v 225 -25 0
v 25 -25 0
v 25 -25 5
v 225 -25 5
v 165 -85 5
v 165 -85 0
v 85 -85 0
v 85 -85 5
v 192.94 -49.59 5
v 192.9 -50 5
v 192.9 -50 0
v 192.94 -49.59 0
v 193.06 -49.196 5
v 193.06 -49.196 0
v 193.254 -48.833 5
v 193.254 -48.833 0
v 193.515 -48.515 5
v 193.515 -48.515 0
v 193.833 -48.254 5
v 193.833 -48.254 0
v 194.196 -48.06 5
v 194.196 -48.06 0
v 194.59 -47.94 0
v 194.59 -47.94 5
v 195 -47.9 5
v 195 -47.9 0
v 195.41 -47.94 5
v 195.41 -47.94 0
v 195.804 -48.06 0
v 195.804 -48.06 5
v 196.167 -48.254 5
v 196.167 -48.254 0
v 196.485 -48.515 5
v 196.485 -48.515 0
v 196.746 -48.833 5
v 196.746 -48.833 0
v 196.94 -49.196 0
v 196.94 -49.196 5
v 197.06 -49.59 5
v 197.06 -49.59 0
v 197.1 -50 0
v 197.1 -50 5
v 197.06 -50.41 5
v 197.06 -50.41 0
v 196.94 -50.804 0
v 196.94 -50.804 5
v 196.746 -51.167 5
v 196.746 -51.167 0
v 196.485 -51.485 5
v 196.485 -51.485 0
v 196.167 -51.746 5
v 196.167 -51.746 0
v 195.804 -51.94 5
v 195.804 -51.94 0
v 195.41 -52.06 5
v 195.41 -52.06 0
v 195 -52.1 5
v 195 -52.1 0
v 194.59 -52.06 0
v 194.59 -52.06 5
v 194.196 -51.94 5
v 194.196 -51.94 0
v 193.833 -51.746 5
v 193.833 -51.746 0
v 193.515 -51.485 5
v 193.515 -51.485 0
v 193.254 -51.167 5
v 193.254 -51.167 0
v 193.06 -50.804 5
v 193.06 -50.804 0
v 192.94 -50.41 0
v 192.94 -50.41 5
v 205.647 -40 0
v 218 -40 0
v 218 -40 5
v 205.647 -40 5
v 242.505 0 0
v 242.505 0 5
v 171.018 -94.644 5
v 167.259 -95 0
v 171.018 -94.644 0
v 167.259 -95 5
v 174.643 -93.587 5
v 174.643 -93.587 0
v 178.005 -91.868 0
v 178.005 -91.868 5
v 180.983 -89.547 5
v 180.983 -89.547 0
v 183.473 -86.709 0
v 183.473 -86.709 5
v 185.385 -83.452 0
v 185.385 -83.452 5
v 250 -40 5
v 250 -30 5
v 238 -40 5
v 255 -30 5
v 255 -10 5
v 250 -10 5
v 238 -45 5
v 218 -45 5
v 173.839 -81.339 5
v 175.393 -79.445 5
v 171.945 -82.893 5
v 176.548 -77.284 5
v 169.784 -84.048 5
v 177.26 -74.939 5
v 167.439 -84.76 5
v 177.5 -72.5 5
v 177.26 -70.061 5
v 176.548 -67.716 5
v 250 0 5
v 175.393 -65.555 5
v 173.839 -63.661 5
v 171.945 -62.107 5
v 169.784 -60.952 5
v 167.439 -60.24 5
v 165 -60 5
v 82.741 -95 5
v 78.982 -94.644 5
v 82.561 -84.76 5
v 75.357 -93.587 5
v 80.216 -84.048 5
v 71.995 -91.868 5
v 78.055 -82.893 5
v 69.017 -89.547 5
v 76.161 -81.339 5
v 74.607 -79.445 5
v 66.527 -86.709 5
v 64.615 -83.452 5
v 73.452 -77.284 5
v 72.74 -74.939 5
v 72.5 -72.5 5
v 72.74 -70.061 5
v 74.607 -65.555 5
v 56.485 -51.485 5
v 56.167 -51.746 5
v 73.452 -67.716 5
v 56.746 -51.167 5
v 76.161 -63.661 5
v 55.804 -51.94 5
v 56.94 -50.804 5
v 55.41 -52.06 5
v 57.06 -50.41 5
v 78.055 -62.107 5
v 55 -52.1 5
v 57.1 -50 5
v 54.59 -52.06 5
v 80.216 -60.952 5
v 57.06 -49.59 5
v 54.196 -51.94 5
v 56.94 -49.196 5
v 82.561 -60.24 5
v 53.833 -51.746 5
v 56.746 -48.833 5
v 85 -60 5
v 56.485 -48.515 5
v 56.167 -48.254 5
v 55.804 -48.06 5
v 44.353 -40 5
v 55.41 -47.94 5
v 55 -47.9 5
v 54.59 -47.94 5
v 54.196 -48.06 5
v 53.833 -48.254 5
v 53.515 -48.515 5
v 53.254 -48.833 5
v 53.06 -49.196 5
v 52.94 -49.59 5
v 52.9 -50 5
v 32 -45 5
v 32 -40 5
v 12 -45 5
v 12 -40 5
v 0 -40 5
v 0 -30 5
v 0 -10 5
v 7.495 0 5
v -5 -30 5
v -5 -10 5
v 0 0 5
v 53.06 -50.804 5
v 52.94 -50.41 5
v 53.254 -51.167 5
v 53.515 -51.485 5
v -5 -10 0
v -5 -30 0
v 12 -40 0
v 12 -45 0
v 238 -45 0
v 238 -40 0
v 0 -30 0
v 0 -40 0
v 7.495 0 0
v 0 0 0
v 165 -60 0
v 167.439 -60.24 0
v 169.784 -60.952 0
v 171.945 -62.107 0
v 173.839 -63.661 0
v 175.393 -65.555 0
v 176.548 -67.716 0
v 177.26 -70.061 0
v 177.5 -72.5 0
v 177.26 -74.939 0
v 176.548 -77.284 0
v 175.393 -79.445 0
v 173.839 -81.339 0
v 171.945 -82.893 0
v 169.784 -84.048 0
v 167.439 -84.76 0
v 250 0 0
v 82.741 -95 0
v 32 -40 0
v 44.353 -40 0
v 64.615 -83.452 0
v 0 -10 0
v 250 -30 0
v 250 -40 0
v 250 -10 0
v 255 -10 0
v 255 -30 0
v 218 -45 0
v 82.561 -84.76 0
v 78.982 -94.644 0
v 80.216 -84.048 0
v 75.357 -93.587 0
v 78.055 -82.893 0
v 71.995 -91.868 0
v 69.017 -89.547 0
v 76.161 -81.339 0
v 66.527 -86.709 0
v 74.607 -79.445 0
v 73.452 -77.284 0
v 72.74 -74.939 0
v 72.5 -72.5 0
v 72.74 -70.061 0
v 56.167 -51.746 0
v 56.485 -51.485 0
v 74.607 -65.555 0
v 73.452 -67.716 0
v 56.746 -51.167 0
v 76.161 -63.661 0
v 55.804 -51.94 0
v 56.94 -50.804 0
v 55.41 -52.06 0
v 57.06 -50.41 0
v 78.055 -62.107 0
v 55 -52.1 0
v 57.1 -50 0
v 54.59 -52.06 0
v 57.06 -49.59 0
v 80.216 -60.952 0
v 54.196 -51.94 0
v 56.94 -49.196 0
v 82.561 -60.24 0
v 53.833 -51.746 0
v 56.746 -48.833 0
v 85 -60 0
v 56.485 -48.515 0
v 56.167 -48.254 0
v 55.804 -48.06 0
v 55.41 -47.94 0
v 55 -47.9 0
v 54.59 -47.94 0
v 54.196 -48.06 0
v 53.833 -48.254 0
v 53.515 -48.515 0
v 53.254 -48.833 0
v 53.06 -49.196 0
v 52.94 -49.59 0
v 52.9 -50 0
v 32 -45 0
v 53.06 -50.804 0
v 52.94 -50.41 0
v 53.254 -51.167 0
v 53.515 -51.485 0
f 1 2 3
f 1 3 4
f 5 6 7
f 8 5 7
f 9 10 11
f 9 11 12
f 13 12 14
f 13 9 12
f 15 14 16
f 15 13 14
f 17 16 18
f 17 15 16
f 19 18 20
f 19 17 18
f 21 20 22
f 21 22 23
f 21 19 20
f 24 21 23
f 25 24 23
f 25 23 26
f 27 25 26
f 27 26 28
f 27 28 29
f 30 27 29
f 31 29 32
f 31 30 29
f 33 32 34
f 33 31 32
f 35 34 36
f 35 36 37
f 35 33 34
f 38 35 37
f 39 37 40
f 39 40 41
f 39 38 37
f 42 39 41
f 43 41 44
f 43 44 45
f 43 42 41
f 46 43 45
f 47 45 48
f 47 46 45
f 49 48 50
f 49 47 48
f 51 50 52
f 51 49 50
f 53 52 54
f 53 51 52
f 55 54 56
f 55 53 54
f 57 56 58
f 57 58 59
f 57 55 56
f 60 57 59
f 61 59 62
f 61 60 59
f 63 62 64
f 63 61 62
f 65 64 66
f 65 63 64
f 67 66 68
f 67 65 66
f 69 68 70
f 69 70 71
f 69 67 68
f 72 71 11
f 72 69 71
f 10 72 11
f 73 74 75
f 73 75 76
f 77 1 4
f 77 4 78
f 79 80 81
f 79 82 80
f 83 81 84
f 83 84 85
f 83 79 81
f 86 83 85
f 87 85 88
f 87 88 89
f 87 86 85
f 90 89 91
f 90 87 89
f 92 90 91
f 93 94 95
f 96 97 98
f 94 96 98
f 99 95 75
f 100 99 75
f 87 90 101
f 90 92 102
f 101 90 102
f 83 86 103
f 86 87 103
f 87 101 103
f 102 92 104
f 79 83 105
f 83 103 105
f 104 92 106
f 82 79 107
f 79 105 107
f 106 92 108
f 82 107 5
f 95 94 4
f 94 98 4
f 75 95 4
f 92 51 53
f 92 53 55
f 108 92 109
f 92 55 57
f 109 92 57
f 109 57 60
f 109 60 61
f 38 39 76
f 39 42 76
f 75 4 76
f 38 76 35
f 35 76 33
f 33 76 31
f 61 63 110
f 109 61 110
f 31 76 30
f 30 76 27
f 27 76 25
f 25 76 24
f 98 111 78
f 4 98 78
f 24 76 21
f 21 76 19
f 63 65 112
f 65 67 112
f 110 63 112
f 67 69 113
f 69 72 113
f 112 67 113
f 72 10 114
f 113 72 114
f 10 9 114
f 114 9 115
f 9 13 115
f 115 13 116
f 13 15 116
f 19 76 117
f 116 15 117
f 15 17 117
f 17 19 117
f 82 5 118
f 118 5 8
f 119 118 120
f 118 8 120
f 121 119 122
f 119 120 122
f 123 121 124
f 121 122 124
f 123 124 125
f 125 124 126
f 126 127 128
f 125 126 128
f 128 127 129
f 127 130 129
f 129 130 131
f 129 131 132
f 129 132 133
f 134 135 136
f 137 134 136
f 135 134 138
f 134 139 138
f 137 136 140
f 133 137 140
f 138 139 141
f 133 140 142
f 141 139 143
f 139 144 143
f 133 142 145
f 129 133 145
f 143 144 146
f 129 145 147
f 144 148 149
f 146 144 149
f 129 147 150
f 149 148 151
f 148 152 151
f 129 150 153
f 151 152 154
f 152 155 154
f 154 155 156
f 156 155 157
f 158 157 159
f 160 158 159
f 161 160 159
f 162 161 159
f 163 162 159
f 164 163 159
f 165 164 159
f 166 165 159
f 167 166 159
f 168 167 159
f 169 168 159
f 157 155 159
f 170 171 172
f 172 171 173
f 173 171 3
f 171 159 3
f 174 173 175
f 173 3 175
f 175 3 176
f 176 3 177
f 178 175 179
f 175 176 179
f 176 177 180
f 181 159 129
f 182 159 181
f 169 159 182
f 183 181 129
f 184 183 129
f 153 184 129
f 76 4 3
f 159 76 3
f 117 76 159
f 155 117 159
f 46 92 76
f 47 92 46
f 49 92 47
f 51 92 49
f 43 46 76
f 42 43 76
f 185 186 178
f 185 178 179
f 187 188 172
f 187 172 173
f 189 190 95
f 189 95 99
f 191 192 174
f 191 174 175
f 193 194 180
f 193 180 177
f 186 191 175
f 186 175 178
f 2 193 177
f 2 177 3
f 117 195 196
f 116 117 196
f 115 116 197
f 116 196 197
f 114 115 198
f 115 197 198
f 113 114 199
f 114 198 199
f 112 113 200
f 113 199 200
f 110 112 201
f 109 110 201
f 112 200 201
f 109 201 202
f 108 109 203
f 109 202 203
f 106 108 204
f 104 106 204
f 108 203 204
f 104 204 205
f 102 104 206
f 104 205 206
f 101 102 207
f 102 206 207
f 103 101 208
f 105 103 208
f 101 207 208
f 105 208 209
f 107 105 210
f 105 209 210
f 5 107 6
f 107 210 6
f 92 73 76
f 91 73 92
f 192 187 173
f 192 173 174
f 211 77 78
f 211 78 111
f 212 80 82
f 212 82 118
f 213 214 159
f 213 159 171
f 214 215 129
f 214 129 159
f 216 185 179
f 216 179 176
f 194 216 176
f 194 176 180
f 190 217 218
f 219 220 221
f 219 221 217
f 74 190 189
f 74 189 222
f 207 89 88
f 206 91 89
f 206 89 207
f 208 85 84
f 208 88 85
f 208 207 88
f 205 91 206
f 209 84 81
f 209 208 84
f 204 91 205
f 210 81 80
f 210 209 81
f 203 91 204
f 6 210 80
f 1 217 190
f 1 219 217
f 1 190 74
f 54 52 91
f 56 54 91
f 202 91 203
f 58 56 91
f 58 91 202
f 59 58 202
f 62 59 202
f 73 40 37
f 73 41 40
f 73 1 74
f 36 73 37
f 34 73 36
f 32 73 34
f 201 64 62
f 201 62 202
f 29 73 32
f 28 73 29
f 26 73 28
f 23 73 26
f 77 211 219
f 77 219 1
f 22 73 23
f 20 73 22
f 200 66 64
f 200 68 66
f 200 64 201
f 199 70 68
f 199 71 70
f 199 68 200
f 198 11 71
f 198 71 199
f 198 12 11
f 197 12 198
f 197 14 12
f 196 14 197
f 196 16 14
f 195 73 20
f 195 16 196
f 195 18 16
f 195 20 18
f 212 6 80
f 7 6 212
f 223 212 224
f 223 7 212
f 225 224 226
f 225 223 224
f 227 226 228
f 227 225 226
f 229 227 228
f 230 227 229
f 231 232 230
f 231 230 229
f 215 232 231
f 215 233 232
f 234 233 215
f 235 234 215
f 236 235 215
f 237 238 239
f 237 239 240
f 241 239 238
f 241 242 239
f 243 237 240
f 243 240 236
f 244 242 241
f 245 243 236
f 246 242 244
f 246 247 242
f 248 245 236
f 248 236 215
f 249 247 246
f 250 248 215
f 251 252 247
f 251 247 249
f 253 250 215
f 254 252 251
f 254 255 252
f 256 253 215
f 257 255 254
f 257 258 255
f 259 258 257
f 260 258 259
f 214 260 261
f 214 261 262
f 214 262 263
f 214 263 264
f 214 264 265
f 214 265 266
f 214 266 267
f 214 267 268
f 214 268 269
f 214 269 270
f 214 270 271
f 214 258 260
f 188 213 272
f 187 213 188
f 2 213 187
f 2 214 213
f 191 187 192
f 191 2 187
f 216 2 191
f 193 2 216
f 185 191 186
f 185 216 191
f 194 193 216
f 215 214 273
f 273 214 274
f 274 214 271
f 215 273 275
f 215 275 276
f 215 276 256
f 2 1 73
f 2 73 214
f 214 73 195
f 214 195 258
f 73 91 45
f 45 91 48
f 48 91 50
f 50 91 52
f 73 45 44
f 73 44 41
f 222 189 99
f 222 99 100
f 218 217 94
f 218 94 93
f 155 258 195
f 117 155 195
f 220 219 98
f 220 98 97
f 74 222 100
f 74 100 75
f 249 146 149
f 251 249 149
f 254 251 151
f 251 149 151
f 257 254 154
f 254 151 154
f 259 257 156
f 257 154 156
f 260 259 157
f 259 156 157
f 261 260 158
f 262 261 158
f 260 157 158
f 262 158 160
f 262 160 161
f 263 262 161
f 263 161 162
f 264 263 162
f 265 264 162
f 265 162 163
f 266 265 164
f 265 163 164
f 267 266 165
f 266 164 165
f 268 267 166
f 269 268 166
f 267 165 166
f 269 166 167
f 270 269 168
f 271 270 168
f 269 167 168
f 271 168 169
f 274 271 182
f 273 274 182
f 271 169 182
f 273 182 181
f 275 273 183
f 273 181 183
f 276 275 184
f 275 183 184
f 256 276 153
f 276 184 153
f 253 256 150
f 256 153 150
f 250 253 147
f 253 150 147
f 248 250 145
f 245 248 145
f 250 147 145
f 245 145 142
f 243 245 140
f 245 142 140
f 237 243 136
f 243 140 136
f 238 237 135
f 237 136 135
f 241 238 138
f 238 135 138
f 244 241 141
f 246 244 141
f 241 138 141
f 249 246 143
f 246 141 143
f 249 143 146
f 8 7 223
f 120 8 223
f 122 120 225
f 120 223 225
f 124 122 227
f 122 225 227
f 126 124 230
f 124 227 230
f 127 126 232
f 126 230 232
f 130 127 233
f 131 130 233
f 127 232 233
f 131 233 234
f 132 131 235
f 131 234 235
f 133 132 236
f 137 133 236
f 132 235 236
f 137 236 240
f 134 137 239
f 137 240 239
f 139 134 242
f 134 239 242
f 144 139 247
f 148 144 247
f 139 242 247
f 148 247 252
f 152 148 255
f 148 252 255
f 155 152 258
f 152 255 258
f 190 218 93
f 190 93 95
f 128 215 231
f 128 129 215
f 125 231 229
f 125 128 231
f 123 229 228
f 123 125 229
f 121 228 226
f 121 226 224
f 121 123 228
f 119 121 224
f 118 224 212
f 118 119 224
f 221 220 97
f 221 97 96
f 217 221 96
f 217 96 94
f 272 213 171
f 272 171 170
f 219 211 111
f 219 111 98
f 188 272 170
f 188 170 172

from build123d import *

# Parameters (mm, degrees)
BOSS_EXTRUDE1_DEPTH = 5
FILLET1_R           = 20
SKETCH3_R           = 2.1
CUT_EXTRUDE1_DEPTH  = 5


with BuildPart() as part:
    # Sketch1 → Boss-Extrude1 (new body)
    with BuildSketch(Plane.XY):
        Polygon((0, 0), (7.494811542, 0), (24.999999999, -25), (224.999999999, -25), (242.505188456, 0), (249.999999998, 0), (249.999999998, -10), (254.999999998, -10), (254.999999998, -30), (249.999999998, -30), (249.999999998, -40), (237.999999998, -40), (237.999999998, -45), (217.999999998, -45), (217.999999998, -40), (205.646921198, -40), (179.999999999, -95), (69.999999999, -95), (44.353078801, -40), (32, -40), (32, -45), (12, -45), (12, -40), (0, -40), (0, -30), (-5, -30), (-5, -10), (0, -10), align=None)
        with BuildLine():
            Line((84.999999999, -60), (164.999999999, -60))
            ThreePointArc((164.999999999, -60), (177.499999999, -72.5), (164.999999999, -85))
            Line((164.999999999, -85), (84.999999999, -85))
            ThreePointArc((84.999999999, -85), (72.499999999, -72.5), (84.999999999, -60))
        make_face(mode=Mode.SUBTRACT)
    extrude(amount=BOSS_EXTRUDE1_DEPTH)

    # Fillet1
    fillet1_edges = [part.edges().sort_by_distance(p)[0] for p in [
        (179.999999999, -95, 2.5),
        (69.999999999, -95, 2.5),
    ]]
    fillet(fillet1_edges, radius=FILLET1_R)

    # Sketch3 → Cut-Extrude1 (cut)
    with BuildSketch(Plane.XY.offset(5)):
        with Locations((55, -50)):
            Circle(SKETCH3_R)
    cut_extrude1 = extrude(amount=-CUT_EXTRUDE1_DEPTH, mode=Mode.SUBTRACT)

    # Mirror1: Cut-Extrude1 across plane
    add(cut_extrude1.mirror(Plane.ZY.offset(-124.999999999)), mode=Mode.SUBTRACT)


solid = part.part
